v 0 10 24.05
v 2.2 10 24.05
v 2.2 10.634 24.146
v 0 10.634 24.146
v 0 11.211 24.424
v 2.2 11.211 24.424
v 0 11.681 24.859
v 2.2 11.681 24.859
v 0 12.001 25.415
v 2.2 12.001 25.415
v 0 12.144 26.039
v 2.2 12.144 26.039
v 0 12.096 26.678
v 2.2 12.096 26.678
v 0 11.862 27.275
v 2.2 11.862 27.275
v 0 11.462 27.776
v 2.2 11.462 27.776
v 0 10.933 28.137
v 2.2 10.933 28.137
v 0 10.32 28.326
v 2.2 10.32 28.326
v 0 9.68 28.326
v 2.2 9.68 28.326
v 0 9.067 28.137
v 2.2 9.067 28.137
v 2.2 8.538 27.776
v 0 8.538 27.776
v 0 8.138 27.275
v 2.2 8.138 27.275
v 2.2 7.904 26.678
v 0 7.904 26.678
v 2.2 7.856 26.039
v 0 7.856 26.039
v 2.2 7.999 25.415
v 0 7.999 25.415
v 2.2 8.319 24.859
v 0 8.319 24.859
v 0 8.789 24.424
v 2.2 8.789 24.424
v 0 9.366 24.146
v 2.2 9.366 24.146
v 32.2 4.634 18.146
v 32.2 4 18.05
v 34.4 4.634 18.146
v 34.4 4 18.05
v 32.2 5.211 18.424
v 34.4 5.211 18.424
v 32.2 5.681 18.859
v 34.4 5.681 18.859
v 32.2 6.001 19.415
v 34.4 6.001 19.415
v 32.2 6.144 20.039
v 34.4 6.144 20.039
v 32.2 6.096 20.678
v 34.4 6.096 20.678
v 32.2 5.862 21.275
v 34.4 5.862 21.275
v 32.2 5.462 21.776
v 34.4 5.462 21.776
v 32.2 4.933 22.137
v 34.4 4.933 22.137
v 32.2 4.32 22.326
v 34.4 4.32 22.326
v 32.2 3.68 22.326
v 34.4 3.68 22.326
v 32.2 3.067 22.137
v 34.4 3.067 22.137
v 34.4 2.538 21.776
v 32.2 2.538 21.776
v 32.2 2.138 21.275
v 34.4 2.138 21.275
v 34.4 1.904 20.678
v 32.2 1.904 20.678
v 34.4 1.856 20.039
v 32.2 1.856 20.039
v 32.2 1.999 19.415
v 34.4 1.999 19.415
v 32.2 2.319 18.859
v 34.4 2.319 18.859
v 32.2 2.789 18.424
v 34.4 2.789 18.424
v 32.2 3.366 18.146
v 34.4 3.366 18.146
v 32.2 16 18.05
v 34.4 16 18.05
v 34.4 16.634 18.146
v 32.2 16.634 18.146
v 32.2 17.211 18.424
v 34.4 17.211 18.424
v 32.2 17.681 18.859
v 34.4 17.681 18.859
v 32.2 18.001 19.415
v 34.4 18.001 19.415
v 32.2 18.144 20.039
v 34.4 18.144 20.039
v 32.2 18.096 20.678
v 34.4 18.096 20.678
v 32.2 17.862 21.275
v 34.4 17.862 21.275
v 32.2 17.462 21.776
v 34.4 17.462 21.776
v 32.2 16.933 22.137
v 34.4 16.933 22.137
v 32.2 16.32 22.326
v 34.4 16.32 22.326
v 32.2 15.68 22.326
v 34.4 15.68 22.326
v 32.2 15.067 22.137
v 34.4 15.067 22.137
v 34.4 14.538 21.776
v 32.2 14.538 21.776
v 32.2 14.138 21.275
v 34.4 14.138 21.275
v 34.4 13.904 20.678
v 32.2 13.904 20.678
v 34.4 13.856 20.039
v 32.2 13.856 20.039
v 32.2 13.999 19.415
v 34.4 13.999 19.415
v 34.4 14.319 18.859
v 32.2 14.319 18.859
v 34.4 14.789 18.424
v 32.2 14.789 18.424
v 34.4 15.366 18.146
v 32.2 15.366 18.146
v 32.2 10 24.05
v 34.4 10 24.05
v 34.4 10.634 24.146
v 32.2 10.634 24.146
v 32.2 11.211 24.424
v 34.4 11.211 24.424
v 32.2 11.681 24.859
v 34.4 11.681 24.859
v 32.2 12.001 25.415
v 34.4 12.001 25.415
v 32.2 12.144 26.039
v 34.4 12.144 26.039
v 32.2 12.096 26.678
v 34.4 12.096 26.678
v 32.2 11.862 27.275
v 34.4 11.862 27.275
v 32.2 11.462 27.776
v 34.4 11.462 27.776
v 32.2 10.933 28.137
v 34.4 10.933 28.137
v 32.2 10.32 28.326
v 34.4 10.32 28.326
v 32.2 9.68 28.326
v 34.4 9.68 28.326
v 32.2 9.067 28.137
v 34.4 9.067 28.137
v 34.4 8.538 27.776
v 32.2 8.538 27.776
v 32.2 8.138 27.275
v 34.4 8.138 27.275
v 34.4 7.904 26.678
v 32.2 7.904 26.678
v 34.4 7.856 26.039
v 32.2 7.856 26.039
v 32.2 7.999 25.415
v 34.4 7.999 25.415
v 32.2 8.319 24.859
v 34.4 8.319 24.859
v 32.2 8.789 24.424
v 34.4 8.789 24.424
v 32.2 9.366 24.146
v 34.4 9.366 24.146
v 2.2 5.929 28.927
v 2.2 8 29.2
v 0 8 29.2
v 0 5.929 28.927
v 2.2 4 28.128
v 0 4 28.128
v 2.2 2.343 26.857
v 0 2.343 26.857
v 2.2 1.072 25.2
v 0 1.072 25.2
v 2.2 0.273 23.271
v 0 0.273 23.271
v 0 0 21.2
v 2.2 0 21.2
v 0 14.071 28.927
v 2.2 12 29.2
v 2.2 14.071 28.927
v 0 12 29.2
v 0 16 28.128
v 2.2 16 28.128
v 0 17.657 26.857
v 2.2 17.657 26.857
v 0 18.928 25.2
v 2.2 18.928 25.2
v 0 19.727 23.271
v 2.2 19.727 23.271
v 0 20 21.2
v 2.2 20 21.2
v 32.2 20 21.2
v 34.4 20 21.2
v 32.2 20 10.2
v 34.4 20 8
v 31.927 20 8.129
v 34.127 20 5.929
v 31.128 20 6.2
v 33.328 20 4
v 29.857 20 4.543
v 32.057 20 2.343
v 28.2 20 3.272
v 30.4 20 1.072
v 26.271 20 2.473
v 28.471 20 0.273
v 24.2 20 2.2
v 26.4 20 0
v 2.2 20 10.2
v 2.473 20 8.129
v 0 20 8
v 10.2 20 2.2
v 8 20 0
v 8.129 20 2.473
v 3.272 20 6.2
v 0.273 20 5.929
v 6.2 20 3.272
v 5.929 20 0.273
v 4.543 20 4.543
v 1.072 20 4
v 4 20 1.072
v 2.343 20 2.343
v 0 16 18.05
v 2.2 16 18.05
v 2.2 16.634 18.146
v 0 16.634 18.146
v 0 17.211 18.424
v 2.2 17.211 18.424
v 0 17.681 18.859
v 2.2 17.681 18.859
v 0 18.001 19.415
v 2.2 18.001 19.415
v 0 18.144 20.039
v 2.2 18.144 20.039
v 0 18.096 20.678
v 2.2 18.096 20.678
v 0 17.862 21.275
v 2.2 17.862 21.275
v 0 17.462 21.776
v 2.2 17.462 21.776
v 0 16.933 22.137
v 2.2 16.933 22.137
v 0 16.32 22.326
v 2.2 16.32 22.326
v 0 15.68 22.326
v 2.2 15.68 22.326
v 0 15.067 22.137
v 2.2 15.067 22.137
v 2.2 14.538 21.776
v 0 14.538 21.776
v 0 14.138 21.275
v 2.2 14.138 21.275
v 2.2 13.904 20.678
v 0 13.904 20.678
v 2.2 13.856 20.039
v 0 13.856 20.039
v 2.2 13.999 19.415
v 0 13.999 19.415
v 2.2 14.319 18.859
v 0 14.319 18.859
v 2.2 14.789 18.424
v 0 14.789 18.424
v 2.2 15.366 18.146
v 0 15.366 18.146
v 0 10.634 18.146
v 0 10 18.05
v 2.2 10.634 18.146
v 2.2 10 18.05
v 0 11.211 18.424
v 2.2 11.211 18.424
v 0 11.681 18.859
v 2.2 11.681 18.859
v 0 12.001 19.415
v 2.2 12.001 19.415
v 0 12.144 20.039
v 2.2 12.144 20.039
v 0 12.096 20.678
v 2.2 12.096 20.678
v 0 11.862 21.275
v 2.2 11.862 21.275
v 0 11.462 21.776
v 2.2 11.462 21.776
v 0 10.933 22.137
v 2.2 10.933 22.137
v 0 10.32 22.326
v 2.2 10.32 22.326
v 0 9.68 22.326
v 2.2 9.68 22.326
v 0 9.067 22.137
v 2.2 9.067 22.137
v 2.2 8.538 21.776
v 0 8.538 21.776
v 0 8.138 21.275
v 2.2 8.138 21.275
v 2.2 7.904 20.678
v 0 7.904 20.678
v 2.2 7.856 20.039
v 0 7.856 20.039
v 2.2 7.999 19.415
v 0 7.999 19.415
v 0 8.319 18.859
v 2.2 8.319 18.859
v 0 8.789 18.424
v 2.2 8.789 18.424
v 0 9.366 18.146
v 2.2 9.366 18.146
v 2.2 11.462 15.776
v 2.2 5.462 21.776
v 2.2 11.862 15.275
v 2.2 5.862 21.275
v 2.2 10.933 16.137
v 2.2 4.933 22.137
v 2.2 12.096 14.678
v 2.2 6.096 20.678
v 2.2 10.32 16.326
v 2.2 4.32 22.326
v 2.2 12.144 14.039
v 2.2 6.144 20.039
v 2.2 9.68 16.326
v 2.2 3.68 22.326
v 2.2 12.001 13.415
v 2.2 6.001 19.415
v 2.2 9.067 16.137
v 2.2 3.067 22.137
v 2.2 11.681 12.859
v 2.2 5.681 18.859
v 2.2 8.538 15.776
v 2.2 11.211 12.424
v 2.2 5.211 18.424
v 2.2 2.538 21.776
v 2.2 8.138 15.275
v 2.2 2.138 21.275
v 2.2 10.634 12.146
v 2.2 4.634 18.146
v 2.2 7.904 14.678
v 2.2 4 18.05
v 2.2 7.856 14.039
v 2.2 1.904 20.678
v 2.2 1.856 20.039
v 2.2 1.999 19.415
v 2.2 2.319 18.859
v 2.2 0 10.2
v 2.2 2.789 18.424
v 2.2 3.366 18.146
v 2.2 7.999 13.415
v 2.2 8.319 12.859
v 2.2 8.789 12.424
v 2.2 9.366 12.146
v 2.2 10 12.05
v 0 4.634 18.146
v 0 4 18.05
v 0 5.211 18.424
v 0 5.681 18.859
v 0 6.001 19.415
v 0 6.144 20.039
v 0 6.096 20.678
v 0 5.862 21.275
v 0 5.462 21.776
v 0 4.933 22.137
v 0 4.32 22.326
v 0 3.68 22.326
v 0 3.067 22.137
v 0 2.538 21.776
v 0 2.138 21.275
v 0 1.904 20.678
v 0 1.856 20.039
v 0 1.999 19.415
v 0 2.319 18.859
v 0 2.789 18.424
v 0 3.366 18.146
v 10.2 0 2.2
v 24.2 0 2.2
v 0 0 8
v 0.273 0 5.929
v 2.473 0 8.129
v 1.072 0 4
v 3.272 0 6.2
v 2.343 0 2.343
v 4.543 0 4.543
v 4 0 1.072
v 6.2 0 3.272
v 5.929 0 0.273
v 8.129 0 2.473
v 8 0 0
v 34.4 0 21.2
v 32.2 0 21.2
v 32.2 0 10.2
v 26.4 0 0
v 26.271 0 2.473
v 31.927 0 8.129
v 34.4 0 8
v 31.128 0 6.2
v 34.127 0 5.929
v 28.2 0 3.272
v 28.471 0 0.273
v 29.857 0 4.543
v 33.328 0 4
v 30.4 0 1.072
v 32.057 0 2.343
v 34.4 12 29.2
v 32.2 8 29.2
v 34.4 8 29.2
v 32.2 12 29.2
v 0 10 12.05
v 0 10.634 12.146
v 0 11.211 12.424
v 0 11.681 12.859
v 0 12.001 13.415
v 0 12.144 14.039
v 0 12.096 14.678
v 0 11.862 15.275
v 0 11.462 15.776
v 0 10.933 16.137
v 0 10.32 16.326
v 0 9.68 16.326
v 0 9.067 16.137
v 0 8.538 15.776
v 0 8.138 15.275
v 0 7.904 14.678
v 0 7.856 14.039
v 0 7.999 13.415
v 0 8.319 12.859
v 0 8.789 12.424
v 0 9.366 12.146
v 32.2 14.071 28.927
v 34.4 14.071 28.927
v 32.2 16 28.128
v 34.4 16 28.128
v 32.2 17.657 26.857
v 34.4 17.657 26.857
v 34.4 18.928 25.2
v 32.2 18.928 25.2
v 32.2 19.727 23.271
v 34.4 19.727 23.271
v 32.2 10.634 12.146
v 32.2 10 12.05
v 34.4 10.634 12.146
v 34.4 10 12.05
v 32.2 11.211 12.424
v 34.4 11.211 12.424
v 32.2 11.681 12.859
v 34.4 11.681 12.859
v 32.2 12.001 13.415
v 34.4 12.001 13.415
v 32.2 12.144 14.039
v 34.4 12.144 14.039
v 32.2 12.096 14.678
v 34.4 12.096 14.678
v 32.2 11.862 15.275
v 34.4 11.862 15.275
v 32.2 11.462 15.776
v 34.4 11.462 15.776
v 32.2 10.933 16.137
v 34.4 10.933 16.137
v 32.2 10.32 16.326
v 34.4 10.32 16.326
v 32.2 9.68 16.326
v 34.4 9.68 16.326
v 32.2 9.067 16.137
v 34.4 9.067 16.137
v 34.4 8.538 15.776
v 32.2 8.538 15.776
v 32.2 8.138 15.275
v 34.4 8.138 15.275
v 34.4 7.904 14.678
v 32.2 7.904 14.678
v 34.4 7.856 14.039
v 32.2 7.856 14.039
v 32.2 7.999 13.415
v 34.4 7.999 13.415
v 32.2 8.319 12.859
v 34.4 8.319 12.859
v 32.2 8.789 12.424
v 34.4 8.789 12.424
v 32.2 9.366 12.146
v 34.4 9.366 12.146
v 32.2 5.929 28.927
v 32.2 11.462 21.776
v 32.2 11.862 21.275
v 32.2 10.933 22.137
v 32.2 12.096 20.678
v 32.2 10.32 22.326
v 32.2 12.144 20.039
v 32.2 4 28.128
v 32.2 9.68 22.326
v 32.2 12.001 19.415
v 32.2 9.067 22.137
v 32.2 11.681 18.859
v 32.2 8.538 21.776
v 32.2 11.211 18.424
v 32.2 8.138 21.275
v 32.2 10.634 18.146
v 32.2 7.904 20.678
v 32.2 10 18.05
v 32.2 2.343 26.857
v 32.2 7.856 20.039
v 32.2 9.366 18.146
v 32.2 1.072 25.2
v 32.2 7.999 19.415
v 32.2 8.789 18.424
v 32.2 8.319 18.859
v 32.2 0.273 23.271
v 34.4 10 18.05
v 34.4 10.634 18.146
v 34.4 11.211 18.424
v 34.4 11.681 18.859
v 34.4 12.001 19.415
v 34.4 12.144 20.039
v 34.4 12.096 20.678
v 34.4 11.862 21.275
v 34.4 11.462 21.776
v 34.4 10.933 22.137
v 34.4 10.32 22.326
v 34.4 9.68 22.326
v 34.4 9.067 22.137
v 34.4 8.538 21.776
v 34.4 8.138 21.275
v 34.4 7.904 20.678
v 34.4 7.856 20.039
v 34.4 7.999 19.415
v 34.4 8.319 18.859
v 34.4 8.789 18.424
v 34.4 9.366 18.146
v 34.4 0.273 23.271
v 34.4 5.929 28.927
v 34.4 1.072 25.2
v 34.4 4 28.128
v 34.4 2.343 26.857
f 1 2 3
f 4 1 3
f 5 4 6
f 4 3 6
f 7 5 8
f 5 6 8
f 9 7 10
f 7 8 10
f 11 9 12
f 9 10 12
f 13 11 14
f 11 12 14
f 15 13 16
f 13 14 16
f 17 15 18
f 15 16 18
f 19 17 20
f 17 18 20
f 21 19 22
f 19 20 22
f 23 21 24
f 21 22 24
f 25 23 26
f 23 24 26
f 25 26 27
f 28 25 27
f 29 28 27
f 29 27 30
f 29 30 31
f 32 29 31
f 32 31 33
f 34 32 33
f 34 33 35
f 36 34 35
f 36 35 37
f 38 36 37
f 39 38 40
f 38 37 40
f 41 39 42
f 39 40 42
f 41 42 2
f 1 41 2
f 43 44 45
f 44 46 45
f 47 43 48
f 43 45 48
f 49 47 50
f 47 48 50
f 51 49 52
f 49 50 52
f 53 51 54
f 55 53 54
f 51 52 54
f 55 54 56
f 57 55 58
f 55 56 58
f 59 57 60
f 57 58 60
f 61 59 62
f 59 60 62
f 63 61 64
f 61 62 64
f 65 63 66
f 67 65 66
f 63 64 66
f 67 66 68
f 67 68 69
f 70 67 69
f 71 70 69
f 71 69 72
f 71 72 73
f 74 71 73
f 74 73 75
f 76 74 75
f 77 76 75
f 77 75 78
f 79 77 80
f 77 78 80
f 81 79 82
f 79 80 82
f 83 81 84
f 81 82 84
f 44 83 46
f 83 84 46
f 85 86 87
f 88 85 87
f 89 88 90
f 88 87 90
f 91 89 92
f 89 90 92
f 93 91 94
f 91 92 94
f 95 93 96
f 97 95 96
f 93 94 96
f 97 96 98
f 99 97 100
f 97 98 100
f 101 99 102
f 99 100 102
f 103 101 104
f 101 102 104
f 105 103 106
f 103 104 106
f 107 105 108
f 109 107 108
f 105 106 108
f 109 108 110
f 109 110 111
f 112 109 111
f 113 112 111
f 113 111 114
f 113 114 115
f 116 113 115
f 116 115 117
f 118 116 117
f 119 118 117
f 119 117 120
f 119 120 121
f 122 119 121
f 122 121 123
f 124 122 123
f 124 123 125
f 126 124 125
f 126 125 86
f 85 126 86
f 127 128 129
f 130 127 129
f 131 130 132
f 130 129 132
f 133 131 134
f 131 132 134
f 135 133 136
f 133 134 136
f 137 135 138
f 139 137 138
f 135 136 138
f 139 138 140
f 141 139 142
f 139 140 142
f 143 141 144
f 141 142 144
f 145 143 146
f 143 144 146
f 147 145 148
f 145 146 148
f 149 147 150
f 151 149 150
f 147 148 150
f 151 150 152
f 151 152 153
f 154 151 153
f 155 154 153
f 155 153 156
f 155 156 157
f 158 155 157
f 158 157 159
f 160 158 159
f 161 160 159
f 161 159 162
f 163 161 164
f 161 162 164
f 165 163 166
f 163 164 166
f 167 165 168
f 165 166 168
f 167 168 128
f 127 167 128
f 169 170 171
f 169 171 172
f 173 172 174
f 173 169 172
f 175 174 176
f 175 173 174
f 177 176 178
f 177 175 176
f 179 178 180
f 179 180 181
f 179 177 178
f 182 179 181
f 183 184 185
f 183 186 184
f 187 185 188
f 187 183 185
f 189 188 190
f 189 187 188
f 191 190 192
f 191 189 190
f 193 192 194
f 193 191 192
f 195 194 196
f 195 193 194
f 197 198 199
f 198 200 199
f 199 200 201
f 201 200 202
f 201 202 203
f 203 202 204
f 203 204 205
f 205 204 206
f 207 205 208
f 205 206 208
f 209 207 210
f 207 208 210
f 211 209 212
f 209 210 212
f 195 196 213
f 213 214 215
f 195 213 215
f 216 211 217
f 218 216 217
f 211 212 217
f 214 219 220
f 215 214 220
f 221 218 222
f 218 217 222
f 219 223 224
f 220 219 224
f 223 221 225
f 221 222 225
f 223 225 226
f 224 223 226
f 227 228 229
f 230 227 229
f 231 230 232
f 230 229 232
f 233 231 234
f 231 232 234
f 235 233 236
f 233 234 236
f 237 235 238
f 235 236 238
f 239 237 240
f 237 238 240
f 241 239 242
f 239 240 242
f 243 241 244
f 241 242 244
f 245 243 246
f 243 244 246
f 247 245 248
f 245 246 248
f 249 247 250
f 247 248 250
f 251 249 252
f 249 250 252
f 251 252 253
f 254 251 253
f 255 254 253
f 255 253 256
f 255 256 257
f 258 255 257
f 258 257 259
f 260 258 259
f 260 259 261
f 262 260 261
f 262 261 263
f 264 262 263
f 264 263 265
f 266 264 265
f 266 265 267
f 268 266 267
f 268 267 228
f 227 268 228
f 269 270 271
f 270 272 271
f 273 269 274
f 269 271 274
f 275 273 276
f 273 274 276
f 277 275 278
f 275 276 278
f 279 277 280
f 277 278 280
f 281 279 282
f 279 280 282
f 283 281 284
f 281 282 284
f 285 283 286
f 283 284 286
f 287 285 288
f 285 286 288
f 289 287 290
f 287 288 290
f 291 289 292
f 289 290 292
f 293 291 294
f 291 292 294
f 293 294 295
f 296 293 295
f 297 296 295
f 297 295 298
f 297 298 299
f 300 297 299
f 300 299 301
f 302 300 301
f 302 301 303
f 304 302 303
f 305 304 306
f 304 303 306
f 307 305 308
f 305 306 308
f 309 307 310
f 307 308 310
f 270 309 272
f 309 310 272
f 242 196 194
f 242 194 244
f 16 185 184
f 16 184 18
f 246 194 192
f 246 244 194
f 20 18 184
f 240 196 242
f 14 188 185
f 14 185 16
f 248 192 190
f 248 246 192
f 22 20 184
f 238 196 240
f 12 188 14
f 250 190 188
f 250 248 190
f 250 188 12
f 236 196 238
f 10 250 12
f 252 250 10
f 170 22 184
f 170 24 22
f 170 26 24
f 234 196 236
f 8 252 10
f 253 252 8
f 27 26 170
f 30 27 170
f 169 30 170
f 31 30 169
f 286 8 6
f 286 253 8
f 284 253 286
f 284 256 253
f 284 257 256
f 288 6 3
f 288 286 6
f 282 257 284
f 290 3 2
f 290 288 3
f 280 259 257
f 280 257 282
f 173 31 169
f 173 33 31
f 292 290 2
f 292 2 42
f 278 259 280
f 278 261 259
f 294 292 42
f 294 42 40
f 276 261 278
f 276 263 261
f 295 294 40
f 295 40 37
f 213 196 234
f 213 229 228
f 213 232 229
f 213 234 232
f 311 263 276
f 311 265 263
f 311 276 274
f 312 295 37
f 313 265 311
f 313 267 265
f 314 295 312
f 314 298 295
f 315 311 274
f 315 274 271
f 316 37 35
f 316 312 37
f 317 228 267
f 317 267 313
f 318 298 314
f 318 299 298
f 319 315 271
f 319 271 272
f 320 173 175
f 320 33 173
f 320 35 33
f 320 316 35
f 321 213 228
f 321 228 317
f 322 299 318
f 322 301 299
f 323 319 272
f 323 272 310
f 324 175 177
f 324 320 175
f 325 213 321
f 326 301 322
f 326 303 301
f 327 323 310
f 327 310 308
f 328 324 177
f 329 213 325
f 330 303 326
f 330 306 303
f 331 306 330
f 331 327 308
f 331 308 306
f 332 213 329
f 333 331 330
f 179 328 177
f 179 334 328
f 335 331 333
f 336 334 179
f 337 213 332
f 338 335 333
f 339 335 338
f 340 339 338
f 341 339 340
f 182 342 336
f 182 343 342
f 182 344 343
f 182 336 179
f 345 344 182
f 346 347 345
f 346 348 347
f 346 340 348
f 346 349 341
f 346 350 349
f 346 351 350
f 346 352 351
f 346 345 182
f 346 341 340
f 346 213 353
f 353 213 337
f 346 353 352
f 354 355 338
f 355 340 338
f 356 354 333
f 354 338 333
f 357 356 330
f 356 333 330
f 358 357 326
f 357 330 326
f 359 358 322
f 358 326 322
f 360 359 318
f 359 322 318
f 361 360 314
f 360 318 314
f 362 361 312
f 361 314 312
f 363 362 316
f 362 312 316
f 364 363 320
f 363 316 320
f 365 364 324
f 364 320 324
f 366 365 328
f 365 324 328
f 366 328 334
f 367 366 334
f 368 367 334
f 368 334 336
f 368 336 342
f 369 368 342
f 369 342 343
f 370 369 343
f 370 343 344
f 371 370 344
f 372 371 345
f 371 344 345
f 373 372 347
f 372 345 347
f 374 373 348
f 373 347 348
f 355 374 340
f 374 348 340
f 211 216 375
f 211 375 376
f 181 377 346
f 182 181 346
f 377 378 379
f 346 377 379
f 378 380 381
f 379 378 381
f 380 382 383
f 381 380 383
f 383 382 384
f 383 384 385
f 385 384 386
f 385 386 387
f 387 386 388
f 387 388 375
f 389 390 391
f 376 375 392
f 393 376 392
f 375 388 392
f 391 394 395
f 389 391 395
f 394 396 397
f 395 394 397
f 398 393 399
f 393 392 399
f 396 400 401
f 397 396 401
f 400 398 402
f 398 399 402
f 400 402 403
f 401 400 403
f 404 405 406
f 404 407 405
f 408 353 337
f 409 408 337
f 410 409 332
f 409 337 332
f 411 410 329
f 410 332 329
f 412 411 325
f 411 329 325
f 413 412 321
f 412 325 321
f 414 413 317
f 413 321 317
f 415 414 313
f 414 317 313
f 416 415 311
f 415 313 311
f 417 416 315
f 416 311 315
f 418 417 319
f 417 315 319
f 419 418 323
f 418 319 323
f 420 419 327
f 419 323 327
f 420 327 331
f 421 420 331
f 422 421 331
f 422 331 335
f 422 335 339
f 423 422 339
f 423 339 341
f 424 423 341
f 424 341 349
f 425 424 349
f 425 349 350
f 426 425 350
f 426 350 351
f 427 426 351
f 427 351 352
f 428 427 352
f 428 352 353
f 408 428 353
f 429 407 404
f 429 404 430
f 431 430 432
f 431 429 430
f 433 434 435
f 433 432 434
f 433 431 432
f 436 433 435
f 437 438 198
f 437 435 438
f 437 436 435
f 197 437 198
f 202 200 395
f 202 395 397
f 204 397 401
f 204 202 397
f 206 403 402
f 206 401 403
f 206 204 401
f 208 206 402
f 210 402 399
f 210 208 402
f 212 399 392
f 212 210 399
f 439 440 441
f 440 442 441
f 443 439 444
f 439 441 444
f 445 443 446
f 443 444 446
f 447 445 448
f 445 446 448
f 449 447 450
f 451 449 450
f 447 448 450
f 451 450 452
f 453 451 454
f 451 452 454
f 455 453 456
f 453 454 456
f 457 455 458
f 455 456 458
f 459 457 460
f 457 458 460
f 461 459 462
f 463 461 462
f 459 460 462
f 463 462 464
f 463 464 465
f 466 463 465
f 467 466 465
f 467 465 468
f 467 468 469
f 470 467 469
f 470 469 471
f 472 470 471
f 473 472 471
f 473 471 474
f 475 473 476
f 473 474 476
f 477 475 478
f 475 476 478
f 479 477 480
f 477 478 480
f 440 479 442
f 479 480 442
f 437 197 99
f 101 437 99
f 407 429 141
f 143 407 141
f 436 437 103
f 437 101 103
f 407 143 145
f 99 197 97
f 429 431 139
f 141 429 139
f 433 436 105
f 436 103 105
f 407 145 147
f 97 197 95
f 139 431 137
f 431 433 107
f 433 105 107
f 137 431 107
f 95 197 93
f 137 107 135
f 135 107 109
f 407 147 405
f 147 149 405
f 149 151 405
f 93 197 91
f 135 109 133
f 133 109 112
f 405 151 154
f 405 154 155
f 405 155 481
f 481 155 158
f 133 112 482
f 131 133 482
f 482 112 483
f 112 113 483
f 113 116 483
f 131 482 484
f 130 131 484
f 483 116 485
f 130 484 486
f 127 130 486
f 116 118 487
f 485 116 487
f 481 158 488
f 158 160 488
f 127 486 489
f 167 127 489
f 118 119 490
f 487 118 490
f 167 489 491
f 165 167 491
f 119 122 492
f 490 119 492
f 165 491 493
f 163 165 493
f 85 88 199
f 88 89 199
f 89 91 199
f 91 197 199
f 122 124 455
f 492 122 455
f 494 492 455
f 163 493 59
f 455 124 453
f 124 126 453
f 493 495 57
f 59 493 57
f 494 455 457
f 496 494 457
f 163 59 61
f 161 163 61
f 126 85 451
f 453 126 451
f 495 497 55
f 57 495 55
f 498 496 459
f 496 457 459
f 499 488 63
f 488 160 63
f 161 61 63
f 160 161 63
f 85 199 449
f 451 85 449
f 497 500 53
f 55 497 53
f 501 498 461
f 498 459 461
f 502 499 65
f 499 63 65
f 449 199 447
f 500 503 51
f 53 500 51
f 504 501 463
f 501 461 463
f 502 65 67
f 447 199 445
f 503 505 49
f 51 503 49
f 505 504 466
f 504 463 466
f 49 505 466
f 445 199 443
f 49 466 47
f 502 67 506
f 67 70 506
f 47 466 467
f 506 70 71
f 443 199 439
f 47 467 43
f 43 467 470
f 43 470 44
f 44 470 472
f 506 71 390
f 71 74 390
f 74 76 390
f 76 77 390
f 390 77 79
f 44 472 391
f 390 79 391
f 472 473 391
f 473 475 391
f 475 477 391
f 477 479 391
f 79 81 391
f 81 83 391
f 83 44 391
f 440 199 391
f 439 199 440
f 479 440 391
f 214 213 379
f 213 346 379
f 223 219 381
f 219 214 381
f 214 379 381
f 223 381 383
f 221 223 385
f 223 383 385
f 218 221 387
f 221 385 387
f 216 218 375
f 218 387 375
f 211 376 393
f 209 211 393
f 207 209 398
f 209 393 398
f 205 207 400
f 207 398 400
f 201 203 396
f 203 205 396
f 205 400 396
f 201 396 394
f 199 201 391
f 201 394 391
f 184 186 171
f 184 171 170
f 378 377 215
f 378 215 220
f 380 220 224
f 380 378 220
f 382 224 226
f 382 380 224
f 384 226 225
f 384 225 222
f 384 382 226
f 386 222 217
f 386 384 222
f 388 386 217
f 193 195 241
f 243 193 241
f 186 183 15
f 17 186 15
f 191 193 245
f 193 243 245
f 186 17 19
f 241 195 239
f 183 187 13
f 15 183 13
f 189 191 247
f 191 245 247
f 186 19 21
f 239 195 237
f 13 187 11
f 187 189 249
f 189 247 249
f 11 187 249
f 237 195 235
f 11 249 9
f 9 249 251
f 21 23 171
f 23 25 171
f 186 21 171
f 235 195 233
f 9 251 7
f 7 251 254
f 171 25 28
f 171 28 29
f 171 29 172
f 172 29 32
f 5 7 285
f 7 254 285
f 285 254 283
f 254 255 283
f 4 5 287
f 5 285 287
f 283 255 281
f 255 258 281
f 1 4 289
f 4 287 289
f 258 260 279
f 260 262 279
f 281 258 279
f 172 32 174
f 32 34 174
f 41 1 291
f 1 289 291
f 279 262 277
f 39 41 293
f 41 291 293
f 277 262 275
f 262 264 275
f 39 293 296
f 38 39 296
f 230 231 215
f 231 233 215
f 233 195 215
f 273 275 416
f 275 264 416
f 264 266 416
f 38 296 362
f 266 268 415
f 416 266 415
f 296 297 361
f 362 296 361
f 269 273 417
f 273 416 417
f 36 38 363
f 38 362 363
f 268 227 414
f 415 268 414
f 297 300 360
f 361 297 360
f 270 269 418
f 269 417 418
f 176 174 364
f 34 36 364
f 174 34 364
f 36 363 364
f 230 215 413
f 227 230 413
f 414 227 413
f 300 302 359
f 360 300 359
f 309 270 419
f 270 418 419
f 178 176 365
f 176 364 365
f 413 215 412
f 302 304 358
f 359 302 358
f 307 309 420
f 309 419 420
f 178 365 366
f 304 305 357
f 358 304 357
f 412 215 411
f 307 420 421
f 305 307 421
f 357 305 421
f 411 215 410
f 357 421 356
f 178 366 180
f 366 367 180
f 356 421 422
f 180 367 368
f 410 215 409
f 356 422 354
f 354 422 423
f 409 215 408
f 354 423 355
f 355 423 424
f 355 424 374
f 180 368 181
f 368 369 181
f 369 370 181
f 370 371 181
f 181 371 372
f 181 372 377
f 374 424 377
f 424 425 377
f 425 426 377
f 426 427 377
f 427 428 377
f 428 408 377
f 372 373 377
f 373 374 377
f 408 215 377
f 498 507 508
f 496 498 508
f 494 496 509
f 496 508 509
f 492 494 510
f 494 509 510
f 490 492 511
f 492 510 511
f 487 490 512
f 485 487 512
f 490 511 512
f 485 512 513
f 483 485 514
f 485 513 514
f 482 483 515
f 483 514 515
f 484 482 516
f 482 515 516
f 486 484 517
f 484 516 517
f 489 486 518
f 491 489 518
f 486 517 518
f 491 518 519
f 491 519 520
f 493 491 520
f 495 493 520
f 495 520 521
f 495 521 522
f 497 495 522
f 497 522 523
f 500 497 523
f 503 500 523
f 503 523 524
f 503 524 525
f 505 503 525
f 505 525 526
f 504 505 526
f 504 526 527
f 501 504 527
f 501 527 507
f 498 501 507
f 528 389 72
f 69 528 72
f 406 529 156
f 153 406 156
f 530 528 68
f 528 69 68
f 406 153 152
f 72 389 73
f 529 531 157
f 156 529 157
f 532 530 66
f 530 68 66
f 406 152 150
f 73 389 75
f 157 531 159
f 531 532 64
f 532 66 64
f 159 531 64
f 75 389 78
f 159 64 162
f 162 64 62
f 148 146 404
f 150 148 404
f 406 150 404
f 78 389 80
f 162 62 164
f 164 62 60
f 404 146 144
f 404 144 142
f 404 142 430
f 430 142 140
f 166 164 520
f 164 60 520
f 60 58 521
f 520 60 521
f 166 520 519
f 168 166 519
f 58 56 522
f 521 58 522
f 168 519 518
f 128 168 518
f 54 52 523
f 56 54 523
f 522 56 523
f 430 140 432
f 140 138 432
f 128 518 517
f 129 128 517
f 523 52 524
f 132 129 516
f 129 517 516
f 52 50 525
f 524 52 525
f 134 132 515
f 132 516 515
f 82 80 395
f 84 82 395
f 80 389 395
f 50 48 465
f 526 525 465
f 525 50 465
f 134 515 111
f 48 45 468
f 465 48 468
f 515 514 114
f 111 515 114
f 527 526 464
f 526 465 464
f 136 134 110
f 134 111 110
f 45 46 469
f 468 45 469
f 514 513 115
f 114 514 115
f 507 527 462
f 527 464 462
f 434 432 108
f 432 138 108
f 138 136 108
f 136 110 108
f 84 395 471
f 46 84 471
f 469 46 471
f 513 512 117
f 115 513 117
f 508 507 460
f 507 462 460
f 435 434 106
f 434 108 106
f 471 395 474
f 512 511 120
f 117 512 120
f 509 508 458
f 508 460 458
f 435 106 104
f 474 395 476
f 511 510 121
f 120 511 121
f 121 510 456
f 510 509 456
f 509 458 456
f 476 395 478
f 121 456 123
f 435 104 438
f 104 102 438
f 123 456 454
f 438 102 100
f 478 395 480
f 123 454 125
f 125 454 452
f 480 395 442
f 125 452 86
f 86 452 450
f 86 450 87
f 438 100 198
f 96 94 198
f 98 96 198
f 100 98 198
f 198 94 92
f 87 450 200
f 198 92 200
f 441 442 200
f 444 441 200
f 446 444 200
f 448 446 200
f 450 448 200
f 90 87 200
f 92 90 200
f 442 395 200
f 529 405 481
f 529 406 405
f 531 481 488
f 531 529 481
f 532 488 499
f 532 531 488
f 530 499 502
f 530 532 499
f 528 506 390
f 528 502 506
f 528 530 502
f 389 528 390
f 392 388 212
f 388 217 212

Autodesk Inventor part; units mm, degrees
ref_plane "YZ Plane" through (0, 0, 0) normal (1, 0, 0) x (0, 1, 0)
ref_plane "XZ Plane" through (0, 0, 0) normal (0, 1, 0) x (-1, 0, 0)
ref_plane "XY Plane" through (0, 0, 0) normal (0, 0, 1) x (1, 0, 0)
sketch "Esquisse1" plane through (0, 0, 0) normal (0, 0, 1) x (1, 0, 0)
  line L0 (0, 0) -> (34.4, 0)
  line L1 (34.4, 0) -> (34.4, 20)
  line L2 (34.4, 20) -> (0, 20)
  line L3 (0, 20) -> (0, 0)
  dimension "d0" = 34.4
  dimension "d1" = 20
extrude "Extrusion1" add sketch "Esquisse1" along normal blind 2.2
sketch "Esquisse2" plane through (0, 0, 2.2) normal (0, 0, 1) x (1, 0, 0)
  line L0 (0, 0) -> (34.4, 0) projected
  line L1 (34.4, 20) -> (0, 20) projected
  line L2 (0, 20) -> (0, 0) projected
  line L3 (0, 20) -> (2.2, 20)
  line L4 (2.2, 20) -> (2.2, 0)
  line L5 (2.2, 0) -> (0, 0)
  line L6 (0, 0) -> (0, 20)
  line L7 (17.2, 20) -> (17.2, 0) construction
  line L8 (34.4, 20) -> (32.2, 20)
  line L9 (32.2, 20) -> (32.2, 0)
  line L10 (32.2, 0) -> (34.4, 0)
  line L11 (34.4, 0) -> (34.4, 20)
  dimension "d4" = 2.2
extrude "Extrusion2" add sketch "Esquisse2" along normal blind 27 contours L2 L1 L4 L0 | L9 L1 L11 L0
sketch "Esquisse3" plane through (34.4, 0, 0) normal (1, 0, 0) x (0, 0, -1)
  line L0 (0, 0) -> (0, 20) construction
  line L1 (-29.2, 0) -> (-29.2, 20) construction
  line L2 (-29.2, 10) -> (0, 10) construction
  circle A0 centre (-20.2, 10) radius 2.15
  line L3 (-20.2, 10) -> (-20.2, 15.2246) construction
  circle A1 centre (-14.2, 10) radius 2.15
  circle A2 centre (-26.2, 10) radius 2.15
  circle A3 centre (-20.2, 10) radius 2.15
  circle A4 centre (-20.2, 16) radius 2.15
  circle A5 centre (-20.2, 4) radius 2.15
  circle A6 centre (-20.2, 10) radius 2.15
  dimension "d7" = 9
  dimension "d8" = 4.3
  dimension "d11" = 6
  dimension "d14" = 6
  dimension "d19" = 6
  dimension "d22" = 6
extrude "Extrusion3" cut sketch "Esquisse3" against normal through all
fillet "Congé1" radius 8 4 edges at (33.3, 20, 29.2) (1.1, 20, 29.2) (1.1, 0, 29.2) (33.3, 0, 29.2)
fillet "Congé2" radius 8 4 edges at (2.2, 10, 2.2) (0, 10, 0) (34.4, 10, 0) (32.2, 10, 2.2)
equation "\"d2\" = UDepth"
equation "\"d4\" = Depth"
equation "\"d8\" = Holes"
equation "\"d28\" = URound"
equation "\"Depth\" = 2.2"
equation "\"Holes\" = 4.3"
equation "\"UDepth\" = Depth"
equation "\"USize\" = 5"
equation "\"URound\" = 8"
properties part number "U"
